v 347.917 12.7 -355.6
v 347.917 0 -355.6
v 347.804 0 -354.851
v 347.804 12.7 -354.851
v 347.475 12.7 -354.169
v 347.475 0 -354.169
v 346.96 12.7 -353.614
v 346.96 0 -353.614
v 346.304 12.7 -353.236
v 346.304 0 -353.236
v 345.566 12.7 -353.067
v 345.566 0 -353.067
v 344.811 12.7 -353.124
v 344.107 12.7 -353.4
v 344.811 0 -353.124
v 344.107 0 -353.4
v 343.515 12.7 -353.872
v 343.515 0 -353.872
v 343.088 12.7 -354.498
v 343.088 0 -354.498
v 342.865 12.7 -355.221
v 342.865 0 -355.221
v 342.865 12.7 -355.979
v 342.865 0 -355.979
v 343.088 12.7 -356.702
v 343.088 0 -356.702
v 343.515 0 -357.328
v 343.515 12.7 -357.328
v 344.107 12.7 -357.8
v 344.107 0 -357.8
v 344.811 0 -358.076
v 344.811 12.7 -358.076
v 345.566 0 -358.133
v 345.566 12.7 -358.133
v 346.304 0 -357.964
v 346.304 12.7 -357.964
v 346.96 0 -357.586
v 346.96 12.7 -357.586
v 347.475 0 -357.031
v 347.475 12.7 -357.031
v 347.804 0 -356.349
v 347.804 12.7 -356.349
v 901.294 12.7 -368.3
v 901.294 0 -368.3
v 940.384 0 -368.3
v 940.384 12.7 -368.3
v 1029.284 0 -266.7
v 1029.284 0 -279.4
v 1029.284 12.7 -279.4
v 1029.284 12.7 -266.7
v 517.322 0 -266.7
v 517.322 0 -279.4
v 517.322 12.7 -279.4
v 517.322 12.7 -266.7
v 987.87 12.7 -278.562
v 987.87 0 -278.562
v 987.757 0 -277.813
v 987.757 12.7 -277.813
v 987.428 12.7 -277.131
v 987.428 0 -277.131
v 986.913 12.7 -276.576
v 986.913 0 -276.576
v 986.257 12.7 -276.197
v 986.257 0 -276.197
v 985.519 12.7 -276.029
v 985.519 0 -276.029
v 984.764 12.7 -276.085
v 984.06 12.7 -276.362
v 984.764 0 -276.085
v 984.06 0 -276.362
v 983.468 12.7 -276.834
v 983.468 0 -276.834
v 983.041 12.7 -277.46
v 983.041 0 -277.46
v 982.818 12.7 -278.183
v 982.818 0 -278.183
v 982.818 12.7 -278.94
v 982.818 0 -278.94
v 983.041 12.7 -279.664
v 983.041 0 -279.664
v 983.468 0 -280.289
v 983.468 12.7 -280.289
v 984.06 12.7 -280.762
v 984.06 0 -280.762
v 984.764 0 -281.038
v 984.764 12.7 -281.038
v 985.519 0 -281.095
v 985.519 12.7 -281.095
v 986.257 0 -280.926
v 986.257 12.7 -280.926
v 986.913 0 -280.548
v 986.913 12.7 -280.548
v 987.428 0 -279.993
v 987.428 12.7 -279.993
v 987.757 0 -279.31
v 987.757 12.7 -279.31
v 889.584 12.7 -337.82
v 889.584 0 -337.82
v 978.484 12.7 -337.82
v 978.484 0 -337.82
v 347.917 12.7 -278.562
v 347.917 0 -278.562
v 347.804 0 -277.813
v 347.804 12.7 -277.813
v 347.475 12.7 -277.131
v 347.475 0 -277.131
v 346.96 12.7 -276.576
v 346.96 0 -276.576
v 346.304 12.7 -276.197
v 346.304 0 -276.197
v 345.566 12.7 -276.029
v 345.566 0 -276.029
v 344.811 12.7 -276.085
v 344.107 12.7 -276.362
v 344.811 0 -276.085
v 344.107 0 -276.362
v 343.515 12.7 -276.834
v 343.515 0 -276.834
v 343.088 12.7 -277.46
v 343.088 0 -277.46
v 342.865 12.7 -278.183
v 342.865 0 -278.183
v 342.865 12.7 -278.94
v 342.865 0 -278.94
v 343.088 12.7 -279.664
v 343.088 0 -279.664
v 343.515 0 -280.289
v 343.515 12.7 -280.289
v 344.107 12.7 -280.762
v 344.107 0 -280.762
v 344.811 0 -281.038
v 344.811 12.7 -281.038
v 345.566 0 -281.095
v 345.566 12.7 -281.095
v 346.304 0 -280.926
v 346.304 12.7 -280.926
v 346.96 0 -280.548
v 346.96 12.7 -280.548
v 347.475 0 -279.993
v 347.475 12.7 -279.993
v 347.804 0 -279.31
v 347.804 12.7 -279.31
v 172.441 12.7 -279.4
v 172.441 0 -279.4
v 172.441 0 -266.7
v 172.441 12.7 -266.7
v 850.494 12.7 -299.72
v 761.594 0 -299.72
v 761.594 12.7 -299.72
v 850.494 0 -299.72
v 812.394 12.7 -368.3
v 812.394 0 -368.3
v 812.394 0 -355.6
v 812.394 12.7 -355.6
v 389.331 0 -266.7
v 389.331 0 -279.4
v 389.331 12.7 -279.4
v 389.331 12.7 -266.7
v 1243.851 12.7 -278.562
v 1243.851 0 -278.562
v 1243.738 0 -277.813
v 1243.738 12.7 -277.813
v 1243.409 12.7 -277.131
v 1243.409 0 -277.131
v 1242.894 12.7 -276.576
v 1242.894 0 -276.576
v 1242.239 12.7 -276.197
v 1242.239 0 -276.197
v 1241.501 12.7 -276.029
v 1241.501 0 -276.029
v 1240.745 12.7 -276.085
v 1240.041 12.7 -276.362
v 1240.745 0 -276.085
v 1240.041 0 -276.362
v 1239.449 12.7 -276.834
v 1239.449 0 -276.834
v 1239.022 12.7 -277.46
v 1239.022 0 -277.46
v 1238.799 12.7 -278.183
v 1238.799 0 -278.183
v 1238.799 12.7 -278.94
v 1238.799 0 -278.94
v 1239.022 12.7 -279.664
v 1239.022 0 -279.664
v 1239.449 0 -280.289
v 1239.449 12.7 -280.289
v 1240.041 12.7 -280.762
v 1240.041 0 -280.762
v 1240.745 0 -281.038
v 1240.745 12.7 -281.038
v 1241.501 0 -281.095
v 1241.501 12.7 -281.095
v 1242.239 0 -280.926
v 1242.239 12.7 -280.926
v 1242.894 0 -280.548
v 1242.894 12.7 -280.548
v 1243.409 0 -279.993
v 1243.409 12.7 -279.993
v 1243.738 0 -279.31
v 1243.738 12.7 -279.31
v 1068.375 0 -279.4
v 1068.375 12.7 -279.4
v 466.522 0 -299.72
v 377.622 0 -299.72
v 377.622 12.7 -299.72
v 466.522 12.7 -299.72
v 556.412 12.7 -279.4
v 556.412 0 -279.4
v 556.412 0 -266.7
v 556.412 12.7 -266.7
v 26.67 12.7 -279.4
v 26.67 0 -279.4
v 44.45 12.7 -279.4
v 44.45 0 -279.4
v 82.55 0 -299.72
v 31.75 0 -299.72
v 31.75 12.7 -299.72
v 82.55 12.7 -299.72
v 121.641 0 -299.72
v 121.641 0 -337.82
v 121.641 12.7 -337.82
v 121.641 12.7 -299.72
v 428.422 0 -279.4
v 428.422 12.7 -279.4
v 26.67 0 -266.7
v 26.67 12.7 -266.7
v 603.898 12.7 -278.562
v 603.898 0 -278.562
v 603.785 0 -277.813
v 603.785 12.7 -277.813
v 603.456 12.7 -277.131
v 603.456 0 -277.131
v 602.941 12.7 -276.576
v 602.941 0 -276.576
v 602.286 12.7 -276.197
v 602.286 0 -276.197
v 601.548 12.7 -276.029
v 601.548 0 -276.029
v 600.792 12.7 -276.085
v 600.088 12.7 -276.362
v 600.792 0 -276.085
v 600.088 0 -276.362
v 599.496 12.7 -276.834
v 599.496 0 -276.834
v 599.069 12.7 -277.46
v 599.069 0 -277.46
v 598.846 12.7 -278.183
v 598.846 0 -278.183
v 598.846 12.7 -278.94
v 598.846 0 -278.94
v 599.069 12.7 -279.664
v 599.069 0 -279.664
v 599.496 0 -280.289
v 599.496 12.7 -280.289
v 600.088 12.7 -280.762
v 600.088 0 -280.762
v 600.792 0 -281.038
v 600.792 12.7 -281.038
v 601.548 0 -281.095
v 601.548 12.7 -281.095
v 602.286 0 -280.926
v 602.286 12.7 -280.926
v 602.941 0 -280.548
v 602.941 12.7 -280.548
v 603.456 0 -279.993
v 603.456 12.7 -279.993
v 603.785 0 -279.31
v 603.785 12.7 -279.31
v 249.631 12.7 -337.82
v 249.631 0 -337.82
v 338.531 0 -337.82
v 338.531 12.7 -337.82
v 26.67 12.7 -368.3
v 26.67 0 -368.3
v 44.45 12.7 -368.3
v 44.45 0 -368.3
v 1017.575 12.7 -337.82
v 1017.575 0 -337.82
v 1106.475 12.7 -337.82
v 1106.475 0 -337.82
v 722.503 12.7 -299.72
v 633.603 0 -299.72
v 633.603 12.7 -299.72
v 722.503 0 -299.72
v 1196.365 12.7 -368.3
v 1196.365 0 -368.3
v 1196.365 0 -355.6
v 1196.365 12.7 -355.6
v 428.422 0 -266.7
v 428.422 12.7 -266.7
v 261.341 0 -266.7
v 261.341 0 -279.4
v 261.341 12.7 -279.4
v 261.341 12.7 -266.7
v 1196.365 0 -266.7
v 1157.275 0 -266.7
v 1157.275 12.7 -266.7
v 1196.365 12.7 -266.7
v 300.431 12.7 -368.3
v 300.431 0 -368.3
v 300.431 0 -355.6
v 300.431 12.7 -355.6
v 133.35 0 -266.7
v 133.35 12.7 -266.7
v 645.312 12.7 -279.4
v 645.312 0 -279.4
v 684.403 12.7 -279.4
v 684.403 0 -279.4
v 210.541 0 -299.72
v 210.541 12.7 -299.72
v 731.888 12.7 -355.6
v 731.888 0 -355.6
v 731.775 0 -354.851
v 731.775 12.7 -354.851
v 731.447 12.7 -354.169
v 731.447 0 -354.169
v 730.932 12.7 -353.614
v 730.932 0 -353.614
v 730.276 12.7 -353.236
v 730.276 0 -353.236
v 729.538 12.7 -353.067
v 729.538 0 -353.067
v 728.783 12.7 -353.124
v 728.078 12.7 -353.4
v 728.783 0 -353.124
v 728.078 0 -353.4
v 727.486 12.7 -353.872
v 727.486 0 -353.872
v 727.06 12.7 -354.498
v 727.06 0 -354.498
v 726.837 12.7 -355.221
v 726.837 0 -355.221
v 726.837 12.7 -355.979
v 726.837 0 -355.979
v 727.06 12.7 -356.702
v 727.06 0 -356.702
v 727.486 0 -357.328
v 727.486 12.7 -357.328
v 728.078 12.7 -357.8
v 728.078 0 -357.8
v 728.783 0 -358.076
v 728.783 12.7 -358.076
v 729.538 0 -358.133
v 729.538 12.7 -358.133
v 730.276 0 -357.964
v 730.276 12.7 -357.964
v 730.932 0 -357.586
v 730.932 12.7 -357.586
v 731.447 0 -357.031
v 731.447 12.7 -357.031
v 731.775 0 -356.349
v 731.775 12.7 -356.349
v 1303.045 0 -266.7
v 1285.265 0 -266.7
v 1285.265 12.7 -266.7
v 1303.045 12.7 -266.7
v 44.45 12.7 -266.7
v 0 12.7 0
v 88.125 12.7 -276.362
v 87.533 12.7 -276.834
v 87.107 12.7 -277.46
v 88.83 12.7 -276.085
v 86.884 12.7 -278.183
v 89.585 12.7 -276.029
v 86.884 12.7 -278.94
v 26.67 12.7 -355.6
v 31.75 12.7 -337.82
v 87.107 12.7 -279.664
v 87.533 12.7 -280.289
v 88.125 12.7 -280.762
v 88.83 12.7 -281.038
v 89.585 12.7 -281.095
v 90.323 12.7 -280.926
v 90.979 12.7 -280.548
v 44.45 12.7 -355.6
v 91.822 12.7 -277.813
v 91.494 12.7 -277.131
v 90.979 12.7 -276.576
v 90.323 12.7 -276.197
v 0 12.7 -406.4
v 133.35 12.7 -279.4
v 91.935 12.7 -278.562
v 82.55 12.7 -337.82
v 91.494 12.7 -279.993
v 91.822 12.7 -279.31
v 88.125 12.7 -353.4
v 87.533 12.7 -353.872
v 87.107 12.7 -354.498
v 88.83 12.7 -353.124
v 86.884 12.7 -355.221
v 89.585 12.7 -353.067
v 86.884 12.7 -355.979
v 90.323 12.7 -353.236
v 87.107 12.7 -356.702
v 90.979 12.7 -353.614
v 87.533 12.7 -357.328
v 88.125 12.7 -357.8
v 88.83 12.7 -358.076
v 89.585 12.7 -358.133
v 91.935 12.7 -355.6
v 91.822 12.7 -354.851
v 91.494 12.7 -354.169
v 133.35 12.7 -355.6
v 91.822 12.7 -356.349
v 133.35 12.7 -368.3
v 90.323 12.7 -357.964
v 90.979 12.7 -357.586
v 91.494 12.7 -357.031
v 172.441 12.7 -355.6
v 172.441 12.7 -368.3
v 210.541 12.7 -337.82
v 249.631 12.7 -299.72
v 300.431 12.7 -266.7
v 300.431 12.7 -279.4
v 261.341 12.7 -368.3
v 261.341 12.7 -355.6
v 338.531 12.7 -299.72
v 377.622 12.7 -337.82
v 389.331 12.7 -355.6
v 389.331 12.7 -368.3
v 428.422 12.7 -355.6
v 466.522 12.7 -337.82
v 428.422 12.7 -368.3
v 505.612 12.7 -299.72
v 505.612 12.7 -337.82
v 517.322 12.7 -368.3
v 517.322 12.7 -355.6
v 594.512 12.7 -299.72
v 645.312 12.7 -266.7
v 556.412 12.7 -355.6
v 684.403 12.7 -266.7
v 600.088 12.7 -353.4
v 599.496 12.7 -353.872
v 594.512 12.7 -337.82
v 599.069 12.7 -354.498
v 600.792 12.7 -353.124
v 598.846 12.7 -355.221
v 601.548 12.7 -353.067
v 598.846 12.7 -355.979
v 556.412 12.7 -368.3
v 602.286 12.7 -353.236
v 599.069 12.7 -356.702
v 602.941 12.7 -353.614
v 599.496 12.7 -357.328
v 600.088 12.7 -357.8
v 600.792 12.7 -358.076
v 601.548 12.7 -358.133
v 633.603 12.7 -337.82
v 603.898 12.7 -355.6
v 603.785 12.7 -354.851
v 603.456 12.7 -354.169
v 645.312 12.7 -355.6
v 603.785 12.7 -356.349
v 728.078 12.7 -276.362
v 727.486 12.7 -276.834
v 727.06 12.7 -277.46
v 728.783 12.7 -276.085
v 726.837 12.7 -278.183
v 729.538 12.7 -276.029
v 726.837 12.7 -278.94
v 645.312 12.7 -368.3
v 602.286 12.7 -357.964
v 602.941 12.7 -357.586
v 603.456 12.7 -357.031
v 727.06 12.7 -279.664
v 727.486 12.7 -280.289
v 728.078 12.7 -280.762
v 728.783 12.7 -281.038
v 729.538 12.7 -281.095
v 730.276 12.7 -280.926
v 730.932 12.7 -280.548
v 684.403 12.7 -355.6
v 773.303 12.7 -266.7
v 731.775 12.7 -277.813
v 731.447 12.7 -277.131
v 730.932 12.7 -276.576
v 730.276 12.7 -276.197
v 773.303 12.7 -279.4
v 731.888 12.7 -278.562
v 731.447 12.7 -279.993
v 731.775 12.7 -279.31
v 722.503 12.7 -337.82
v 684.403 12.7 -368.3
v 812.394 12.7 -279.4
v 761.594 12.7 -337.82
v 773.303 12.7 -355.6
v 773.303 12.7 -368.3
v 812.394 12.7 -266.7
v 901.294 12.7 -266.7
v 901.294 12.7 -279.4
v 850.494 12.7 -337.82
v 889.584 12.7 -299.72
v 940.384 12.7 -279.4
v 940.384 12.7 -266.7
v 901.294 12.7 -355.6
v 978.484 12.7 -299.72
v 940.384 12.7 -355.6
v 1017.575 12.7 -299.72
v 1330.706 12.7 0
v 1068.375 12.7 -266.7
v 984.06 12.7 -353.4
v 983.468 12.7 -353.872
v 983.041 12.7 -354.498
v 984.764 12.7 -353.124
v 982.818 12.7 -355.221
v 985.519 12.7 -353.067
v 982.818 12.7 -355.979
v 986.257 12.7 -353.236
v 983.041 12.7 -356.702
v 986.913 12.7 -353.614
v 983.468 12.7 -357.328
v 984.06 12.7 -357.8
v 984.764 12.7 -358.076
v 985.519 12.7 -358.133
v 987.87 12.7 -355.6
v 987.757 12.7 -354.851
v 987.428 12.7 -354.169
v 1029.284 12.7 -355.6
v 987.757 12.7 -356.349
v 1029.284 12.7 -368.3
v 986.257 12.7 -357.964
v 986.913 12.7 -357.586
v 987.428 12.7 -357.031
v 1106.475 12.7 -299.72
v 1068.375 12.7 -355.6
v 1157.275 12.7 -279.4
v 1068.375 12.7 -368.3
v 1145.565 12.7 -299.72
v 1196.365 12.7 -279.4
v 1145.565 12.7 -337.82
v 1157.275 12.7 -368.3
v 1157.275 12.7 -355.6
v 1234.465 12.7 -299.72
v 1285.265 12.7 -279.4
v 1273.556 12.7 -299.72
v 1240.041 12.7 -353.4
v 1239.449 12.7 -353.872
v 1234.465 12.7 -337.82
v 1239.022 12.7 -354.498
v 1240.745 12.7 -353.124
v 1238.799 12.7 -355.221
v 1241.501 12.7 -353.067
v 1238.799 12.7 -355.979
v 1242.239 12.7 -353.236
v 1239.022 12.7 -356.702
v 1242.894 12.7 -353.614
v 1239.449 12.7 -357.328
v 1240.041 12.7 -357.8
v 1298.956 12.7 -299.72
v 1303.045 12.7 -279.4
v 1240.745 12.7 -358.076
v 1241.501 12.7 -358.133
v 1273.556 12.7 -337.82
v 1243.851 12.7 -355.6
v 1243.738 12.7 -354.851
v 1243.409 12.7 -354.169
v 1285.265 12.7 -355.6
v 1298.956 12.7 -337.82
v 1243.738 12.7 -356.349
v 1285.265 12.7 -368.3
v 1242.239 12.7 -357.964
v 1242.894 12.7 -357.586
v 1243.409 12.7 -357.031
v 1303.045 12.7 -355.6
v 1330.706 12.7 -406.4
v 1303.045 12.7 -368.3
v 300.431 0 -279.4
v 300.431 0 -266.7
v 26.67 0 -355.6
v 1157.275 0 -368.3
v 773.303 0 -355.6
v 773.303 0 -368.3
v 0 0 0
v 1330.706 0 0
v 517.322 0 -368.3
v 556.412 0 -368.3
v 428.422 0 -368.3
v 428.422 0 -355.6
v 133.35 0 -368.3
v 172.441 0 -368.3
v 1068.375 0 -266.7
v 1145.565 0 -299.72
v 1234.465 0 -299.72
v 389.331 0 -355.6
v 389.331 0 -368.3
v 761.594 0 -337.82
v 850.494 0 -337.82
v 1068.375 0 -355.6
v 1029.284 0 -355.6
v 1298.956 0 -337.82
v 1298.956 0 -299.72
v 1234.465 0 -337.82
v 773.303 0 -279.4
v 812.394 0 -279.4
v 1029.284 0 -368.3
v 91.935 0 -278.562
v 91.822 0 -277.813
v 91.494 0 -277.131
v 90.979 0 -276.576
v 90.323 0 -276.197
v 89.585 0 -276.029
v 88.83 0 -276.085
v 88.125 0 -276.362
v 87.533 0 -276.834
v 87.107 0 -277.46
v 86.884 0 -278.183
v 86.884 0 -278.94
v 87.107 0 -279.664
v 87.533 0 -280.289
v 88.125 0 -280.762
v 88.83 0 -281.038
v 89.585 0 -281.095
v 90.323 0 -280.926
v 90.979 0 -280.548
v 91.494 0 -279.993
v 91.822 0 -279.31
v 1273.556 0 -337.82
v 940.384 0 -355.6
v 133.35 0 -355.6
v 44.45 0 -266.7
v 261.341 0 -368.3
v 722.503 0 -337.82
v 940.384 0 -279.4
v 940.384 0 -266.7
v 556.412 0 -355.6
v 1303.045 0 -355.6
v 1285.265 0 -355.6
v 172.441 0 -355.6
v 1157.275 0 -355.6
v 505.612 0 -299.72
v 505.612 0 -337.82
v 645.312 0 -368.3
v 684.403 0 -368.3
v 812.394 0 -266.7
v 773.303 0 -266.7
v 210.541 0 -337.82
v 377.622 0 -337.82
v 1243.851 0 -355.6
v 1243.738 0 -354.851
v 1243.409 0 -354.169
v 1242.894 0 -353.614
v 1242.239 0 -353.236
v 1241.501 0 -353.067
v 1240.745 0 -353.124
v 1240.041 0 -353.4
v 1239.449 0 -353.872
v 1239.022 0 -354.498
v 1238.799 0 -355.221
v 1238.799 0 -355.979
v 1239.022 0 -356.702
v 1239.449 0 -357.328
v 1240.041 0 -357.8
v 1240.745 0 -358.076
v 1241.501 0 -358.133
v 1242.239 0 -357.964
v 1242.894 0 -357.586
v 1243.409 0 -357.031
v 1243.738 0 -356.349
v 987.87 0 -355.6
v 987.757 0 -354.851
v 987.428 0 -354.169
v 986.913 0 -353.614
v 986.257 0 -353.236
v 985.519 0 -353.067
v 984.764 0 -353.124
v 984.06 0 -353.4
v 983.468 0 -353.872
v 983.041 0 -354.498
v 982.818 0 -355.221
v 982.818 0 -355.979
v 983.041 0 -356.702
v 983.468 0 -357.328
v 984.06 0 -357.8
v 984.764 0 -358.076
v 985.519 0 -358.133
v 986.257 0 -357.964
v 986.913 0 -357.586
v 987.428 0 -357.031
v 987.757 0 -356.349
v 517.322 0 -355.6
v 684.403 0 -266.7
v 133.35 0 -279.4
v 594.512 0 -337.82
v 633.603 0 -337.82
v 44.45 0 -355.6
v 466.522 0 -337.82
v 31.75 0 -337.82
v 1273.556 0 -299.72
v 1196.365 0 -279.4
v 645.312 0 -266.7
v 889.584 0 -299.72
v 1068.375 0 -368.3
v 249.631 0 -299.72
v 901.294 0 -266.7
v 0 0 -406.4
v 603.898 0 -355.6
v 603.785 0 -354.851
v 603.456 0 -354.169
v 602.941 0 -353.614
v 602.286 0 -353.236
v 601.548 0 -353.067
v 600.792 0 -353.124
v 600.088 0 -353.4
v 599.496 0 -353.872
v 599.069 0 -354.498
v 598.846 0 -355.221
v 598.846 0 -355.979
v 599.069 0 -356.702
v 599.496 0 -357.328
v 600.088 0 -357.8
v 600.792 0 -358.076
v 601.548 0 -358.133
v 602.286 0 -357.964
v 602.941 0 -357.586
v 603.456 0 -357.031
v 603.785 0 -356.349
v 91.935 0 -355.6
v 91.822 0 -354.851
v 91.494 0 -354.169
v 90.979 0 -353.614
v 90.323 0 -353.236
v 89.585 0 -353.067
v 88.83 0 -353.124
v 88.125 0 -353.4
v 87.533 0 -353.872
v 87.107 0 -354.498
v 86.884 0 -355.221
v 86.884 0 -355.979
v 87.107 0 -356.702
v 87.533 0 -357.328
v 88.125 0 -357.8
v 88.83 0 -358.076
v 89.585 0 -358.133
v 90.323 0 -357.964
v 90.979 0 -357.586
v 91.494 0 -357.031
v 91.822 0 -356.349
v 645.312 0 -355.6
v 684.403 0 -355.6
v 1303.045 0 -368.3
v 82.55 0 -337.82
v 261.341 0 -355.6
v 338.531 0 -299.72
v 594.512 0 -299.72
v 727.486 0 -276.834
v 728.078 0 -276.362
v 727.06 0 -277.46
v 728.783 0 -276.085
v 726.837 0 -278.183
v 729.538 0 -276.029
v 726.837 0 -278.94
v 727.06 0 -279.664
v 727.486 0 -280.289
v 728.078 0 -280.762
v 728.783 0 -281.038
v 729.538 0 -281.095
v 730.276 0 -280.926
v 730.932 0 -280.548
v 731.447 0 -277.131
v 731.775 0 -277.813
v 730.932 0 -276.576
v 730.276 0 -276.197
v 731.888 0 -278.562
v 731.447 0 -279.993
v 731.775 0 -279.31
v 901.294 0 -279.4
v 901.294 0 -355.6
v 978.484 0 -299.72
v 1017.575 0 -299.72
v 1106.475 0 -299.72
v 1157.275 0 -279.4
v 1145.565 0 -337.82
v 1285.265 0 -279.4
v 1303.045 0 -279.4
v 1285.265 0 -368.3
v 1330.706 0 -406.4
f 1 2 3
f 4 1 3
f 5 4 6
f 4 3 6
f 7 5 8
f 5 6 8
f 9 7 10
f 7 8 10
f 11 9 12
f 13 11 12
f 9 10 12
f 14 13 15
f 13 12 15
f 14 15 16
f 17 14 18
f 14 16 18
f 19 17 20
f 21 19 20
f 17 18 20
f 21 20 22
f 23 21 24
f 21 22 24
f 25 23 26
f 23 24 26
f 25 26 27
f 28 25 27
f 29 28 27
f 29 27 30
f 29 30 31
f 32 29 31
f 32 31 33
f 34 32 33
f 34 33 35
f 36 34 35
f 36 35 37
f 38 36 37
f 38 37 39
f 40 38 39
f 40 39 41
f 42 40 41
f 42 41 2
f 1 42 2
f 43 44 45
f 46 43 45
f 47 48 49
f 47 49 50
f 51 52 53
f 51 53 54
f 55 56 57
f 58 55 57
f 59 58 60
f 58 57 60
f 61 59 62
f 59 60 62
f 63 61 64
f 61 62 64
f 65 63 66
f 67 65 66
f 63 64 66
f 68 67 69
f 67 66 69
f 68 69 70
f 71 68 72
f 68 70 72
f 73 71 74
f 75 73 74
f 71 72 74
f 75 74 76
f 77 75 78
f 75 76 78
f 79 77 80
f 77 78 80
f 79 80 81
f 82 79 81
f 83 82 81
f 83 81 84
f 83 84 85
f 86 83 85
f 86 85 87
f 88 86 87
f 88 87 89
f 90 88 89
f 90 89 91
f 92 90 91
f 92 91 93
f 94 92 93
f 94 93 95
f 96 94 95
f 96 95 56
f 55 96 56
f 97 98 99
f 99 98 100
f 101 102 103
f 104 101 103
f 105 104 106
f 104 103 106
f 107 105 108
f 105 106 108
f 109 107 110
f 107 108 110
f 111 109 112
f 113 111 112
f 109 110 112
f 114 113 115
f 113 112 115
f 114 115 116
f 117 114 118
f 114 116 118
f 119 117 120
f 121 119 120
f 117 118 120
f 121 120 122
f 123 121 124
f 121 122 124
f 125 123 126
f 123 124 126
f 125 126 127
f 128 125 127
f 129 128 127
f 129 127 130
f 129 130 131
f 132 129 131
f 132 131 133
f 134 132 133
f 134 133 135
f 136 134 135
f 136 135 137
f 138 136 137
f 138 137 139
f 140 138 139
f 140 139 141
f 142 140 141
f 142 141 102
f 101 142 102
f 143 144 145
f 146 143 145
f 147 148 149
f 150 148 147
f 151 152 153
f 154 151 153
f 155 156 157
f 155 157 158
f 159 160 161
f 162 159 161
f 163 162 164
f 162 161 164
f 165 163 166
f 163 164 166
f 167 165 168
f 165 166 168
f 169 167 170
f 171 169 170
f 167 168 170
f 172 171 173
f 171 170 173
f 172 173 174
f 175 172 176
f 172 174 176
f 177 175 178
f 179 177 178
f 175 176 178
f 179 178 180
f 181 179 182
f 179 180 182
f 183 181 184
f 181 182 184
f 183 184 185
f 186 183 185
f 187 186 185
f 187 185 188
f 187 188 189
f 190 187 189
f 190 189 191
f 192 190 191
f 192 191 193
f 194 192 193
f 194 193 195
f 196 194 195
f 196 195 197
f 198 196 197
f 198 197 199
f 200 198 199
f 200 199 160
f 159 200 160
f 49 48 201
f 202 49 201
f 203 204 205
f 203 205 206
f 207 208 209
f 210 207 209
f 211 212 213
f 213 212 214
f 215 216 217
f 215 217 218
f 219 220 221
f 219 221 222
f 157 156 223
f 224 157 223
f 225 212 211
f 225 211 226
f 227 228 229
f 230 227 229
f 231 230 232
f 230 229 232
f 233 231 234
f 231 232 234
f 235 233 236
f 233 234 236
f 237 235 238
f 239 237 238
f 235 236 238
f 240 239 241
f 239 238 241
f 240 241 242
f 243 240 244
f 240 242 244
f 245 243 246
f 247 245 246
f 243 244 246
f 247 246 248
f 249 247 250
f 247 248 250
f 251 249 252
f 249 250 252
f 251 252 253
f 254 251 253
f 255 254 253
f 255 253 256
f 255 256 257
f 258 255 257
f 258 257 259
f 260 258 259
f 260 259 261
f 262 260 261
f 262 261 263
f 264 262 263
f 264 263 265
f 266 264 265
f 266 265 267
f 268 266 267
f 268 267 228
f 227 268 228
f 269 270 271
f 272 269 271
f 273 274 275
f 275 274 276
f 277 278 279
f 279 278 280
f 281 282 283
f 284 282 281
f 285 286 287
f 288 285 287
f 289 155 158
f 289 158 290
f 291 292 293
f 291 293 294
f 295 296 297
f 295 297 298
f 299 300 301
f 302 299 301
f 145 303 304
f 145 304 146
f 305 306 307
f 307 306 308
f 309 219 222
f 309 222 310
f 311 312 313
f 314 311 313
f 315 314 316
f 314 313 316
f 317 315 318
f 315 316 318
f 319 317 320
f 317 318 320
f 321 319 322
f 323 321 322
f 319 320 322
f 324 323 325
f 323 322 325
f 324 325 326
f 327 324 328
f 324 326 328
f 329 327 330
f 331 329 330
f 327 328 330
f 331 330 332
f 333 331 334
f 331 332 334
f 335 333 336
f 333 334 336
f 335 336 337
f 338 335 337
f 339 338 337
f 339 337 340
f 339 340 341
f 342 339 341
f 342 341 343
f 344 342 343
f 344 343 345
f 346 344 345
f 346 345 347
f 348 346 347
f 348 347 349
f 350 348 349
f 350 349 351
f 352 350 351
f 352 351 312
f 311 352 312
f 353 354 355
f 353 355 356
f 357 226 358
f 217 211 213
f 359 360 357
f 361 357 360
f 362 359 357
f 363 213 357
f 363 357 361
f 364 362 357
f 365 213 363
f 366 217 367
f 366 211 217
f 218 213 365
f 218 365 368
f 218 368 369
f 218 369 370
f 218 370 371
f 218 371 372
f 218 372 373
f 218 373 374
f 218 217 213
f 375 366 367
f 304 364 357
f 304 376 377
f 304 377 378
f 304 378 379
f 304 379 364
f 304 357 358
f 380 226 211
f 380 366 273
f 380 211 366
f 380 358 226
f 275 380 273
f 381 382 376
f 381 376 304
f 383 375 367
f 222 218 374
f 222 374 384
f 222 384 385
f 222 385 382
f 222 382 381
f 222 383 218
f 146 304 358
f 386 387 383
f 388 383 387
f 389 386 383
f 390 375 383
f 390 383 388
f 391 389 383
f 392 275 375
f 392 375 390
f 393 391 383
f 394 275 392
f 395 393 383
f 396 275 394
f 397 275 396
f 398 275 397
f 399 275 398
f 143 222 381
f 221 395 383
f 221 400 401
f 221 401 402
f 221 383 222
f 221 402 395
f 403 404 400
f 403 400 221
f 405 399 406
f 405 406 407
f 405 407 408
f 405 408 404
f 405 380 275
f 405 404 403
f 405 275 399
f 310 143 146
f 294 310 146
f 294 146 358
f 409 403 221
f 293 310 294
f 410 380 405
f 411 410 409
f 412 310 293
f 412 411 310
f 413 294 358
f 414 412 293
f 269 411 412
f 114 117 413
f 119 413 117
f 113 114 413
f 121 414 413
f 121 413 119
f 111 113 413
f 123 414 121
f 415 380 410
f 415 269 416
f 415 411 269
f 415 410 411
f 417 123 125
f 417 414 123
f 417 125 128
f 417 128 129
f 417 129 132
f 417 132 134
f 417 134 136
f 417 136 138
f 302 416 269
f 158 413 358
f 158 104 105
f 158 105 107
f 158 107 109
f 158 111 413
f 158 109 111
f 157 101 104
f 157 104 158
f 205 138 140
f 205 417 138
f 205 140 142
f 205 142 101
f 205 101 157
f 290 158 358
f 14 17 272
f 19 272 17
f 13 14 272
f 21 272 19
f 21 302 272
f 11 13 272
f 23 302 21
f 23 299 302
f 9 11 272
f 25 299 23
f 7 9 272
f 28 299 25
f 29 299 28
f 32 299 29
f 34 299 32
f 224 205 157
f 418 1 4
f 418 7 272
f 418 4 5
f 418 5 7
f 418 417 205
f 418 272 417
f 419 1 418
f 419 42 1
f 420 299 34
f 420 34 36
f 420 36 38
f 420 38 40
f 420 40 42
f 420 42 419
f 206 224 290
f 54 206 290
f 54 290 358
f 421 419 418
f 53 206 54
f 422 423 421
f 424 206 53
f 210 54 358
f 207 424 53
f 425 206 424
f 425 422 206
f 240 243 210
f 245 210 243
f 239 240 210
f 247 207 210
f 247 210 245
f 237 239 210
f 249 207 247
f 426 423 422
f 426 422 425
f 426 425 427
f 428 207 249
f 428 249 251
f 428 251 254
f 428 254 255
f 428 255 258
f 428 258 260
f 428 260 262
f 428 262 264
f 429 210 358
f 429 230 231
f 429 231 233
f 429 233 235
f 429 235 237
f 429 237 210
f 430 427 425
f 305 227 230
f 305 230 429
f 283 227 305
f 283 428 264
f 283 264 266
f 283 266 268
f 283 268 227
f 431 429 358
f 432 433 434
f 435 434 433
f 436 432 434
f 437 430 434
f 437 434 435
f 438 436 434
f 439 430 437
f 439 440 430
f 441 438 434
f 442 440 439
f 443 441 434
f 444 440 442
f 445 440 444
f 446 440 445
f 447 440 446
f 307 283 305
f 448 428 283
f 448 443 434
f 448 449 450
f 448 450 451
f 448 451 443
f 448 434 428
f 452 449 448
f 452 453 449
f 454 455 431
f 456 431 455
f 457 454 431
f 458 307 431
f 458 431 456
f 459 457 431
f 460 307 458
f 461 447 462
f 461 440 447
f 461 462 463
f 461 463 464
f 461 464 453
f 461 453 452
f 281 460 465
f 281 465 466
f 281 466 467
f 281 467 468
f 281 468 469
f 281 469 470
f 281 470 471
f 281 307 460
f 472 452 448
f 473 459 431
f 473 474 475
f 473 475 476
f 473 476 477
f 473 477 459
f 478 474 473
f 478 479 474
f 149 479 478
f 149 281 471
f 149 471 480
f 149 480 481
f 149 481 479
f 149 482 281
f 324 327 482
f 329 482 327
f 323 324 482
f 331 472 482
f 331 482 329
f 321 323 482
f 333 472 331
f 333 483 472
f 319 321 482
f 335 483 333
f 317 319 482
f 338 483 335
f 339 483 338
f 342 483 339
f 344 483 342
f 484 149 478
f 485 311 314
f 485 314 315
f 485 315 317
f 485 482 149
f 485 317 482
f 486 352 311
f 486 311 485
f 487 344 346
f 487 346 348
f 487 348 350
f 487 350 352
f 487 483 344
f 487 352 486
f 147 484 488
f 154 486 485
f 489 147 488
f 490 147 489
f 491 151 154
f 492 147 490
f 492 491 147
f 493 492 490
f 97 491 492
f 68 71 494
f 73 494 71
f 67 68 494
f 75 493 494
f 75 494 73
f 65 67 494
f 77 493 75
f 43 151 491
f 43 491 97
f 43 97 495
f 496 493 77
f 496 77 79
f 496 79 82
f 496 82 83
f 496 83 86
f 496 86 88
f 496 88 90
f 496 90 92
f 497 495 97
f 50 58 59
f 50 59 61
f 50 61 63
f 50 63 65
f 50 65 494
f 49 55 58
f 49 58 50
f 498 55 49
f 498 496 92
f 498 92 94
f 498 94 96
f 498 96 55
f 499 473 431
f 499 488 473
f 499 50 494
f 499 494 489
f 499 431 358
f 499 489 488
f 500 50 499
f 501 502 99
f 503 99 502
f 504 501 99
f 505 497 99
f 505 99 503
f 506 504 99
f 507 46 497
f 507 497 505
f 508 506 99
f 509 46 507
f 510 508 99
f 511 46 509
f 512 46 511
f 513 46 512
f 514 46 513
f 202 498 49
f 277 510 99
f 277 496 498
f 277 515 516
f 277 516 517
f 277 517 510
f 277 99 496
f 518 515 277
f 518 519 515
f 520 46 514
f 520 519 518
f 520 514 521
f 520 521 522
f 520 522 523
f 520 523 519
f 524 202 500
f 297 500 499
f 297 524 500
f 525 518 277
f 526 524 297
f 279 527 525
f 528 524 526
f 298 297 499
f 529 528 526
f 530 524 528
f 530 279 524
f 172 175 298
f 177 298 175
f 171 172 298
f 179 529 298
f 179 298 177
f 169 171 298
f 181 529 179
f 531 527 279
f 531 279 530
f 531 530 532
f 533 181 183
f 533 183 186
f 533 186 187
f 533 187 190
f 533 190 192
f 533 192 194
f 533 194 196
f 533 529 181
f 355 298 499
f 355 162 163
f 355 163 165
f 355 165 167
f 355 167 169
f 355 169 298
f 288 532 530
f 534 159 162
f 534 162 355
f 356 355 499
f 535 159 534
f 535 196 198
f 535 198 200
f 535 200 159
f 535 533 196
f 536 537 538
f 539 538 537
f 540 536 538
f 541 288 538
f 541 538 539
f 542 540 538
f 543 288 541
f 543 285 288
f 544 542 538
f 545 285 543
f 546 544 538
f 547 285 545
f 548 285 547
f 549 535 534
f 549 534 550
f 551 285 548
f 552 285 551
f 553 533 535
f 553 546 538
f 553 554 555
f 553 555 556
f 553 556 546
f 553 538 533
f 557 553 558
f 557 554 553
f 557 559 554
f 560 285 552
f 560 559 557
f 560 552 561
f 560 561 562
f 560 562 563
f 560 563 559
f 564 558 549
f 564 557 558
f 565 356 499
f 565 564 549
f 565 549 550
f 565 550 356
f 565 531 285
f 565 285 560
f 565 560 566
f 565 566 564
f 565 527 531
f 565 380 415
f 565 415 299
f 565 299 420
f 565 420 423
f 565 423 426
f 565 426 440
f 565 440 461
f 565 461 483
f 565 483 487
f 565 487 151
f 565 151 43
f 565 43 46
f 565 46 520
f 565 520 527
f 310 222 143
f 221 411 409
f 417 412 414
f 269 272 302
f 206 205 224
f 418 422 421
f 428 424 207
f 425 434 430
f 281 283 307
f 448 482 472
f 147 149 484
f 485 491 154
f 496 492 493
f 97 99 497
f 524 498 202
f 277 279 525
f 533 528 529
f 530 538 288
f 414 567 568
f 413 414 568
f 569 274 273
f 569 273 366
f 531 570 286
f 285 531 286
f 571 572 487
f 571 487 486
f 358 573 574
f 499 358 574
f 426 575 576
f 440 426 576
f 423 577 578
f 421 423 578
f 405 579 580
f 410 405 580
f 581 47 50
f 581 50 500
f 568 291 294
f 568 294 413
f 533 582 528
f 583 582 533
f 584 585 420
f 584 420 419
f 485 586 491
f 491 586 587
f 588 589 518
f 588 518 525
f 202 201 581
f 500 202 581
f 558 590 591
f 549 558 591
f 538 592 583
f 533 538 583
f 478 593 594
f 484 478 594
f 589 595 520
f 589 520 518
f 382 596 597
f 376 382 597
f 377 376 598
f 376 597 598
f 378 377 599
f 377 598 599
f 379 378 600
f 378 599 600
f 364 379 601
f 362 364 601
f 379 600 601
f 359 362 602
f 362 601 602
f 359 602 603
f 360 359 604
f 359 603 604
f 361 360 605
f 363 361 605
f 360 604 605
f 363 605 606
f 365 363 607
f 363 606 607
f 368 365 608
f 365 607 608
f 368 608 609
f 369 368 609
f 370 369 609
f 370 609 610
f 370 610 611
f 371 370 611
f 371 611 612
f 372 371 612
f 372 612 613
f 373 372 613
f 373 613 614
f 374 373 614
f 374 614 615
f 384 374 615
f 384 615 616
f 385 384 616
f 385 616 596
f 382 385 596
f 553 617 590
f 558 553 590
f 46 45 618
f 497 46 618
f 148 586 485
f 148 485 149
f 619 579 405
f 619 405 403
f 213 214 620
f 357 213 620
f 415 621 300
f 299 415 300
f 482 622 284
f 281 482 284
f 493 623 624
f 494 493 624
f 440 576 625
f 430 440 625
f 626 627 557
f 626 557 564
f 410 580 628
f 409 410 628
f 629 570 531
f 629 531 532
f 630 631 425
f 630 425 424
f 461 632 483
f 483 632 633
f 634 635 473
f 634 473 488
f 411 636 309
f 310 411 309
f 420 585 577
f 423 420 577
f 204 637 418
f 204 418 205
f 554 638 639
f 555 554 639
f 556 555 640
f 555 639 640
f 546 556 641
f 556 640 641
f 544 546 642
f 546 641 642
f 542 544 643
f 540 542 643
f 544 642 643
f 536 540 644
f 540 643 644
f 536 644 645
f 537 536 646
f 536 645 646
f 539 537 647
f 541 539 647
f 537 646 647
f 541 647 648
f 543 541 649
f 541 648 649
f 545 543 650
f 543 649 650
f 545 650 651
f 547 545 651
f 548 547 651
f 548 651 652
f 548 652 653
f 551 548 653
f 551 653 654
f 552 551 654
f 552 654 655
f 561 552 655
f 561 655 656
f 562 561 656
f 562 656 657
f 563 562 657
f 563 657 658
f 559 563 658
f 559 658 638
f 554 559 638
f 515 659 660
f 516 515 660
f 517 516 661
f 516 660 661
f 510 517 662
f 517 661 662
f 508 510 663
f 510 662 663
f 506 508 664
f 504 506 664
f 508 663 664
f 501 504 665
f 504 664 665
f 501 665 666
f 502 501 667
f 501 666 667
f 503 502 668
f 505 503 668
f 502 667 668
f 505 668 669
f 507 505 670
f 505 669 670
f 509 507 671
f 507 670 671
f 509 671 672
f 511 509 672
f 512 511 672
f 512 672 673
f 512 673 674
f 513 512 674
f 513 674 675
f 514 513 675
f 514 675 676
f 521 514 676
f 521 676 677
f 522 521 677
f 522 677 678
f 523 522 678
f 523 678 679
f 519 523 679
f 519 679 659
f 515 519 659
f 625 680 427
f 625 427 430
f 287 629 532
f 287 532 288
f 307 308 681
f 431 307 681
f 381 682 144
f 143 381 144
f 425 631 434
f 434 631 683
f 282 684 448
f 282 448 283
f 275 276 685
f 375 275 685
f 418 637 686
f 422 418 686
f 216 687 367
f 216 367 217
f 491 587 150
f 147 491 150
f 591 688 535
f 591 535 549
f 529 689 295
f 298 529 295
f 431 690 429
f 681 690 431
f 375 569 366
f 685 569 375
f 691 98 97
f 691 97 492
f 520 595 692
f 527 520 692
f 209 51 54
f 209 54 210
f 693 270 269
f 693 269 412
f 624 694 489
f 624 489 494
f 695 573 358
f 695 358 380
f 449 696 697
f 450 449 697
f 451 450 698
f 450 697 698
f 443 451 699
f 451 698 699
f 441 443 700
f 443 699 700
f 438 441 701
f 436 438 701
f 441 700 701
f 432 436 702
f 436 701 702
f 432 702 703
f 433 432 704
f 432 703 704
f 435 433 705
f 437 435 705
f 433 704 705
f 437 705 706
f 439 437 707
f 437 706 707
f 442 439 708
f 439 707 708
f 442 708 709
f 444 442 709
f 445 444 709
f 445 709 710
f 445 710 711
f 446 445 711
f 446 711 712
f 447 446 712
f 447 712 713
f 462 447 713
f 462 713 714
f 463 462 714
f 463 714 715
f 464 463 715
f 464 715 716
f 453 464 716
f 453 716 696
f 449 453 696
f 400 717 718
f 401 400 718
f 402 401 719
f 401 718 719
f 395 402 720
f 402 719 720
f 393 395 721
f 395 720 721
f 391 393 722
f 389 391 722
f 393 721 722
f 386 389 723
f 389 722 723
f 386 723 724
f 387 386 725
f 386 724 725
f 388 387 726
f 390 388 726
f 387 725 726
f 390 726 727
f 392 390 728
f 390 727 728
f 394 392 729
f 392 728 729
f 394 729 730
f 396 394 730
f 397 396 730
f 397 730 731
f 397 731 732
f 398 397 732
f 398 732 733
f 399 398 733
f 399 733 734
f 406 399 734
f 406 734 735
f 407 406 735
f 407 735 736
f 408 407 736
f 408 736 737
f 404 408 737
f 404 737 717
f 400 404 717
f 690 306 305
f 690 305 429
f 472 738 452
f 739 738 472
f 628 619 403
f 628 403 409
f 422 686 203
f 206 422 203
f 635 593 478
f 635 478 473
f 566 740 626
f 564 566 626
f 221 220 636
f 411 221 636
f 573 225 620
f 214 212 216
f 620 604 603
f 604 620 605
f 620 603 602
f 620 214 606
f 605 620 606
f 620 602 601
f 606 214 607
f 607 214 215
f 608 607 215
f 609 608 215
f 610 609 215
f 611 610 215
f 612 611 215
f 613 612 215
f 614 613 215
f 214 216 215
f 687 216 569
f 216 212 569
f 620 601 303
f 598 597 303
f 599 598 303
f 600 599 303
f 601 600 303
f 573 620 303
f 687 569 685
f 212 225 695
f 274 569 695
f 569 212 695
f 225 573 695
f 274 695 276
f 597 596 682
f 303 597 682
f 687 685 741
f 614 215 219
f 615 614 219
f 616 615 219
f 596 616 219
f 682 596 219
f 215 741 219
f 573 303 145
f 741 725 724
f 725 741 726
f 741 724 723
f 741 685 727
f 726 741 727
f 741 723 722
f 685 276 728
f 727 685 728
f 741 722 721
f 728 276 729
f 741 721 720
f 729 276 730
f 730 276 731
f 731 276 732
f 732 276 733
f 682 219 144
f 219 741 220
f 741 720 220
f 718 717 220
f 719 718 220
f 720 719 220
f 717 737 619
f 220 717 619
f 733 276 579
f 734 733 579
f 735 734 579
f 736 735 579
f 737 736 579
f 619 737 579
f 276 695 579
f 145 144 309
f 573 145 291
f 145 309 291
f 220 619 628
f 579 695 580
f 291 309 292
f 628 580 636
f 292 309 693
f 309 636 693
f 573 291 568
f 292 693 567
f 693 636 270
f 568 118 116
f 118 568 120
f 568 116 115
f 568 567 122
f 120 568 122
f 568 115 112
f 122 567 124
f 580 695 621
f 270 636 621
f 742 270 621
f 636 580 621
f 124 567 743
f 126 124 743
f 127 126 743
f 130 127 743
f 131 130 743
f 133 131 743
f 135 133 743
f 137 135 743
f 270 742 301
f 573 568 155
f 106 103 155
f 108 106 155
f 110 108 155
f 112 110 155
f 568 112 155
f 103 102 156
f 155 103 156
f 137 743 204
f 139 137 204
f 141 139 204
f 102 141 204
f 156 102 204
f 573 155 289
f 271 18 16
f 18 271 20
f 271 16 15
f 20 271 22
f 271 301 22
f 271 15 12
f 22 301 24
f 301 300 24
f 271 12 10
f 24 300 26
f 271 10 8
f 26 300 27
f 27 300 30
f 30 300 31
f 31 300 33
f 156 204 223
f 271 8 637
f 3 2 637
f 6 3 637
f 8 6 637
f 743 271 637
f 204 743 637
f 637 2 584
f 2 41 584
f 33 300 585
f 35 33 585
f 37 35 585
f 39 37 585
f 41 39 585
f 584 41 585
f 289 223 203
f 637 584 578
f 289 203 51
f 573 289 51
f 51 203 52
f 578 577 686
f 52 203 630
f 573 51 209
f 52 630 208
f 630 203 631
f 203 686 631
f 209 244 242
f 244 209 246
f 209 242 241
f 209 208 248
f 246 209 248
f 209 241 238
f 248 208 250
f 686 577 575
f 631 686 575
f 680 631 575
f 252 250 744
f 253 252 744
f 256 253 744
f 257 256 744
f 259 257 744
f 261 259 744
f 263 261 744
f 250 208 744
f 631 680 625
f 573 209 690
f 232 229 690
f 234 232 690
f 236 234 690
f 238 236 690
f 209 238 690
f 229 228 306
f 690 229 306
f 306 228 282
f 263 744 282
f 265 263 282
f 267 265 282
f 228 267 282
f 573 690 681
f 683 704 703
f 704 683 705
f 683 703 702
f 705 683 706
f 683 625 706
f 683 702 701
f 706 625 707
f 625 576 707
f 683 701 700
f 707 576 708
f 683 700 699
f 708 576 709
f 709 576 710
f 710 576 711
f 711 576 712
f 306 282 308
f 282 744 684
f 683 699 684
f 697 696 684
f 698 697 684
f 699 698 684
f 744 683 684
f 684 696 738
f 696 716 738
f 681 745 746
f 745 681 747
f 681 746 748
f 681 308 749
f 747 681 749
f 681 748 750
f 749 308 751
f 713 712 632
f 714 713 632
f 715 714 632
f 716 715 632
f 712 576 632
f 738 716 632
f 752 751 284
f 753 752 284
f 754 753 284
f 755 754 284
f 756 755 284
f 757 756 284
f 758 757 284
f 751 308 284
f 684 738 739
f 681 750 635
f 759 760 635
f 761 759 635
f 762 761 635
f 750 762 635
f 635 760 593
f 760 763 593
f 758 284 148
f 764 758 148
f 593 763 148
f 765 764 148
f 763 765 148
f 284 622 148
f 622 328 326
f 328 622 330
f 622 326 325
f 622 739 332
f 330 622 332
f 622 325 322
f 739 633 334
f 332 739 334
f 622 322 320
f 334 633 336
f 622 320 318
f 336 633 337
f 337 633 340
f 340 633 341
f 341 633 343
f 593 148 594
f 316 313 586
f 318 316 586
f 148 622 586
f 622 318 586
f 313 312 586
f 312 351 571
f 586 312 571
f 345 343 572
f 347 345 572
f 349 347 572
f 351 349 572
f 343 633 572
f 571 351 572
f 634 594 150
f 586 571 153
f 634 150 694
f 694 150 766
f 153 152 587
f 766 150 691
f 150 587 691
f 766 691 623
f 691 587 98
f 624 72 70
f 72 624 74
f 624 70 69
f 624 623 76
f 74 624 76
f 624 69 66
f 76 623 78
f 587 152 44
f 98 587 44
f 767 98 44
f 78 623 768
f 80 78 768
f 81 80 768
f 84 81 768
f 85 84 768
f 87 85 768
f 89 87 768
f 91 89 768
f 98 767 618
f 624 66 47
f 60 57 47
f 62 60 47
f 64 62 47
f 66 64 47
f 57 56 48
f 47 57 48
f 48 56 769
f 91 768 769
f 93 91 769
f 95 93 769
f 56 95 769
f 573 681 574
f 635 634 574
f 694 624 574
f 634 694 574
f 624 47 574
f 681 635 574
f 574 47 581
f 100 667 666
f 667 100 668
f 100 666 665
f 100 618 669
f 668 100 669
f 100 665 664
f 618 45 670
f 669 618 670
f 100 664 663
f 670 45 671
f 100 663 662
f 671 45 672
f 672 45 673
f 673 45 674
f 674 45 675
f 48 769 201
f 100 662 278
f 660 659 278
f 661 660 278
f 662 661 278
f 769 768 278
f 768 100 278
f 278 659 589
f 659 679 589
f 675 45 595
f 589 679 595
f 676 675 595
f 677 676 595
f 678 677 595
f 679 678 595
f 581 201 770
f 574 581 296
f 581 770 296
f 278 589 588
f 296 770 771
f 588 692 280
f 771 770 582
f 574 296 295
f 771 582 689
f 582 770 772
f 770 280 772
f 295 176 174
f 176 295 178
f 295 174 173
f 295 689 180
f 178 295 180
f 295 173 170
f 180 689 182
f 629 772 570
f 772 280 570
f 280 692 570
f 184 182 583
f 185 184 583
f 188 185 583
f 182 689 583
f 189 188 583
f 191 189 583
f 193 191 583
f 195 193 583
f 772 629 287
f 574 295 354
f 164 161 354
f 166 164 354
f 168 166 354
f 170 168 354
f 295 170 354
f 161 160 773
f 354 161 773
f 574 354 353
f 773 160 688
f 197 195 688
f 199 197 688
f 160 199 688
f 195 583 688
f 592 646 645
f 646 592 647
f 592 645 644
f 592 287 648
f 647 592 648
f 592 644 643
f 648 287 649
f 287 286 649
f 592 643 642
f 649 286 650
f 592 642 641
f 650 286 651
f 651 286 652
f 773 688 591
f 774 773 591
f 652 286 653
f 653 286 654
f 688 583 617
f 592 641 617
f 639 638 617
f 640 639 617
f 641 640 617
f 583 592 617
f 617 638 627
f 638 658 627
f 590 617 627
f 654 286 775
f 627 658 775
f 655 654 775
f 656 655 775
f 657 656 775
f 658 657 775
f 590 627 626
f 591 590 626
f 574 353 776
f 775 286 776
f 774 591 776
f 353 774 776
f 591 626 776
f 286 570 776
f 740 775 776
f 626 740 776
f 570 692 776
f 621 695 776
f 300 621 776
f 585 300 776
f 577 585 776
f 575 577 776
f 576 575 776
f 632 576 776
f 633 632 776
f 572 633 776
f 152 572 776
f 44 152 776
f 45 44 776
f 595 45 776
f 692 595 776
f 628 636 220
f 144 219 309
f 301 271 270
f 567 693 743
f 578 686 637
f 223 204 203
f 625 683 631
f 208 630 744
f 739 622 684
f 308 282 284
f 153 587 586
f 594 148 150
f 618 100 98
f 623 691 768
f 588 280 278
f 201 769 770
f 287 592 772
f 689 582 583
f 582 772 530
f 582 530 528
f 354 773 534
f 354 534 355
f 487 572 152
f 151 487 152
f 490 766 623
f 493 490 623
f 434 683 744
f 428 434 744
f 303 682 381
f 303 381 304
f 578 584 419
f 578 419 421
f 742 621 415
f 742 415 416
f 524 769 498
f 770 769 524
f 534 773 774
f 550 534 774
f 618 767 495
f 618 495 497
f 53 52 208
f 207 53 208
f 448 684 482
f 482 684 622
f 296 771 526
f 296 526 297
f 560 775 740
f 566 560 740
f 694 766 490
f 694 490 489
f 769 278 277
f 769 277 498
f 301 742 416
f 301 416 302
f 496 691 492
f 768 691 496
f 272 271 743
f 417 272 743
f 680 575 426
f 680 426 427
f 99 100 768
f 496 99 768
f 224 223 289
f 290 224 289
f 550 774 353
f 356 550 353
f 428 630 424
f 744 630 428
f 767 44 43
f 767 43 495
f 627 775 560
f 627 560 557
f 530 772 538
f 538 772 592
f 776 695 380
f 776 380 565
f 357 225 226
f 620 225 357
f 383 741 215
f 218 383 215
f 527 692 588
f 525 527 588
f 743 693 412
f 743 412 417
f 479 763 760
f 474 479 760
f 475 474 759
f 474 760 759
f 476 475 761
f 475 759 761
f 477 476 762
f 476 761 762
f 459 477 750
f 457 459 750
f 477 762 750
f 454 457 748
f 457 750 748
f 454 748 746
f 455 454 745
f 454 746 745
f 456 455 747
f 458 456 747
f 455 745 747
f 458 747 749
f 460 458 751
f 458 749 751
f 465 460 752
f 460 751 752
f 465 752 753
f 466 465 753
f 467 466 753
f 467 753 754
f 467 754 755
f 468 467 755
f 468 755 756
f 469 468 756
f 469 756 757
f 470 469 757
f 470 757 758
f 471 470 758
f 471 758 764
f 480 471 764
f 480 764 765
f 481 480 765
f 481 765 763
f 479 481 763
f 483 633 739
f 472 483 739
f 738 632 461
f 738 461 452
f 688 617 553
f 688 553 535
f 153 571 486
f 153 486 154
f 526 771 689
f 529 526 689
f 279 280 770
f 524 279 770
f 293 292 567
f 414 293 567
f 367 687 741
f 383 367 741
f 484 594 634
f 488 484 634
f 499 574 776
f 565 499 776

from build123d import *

# Parameters (mm, degrees)
SKETCH1_W           = 1330.706
SKETCH1_H           = 406.4
BOSS_EXTRUDE1_DEPTH = 12.7
SKETCH3_R           = 2.54
SKETCH3_W           = 50.8
SKETCH3_H           = 38.1
SKETCH3_W_2         = 88.9
SKETCH3_W_3         = 17.78
SKETCH3_H_2         = 12.7
SKETCH3_W_4         = 25.4
SKETCH3_W_5         = 39.0906
CUT_EXTRUDE2_DEPTH  = 13.7


with BuildPart() as part:
    # Sketch1 → Boss-Extrude1 (new body)
    with BuildSketch(Plane(origin=(0, 0, 0), x_dir=(1, 0, 0), z_dir=(0, 1, 0))):
        with Locations((665.353, 203.2)):
            Rectangle(SKETCH1_W, SKETCH1_H)
    extrude(amount=BOSS_EXTRUDE1_DEPTH)

    # Sketch3 → Cut-Extrude2 (cut, through all)
    with BuildSketch(Plane.XZ):
        with Locations((89.3953, -278.5618)):
            Circle(SKETCH3_R)
        with Locations((89.3953, -355.6)):
            Circle(SKETCH3_R)
        with Locations((345.3765, -278.5618)):
            Circle(SKETCH3_R)
        with Locations((345.3765, -355.6)):
            Circle(SKETCH3_R)
        with Locations((601.3577, -278.5618)):
            Circle(SKETCH3_R)
        with Locations((601.3577, -355.6)):
            Circle(SKETCH3_R)
        with Locations((729.3483, -278.5618)):
            Circle(SKETCH3_R)
        with Locations((729.3483, -355.6)):
            Circle(SKETCH3_R)
        with Locations((985.3295, -278.5618)):
            Circle(SKETCH3_R)
        with Locations((985.3295, -355.6)):
            Circle(SKETCH3_R)
        with Locations((1241.3107, -278.5618)):
            Circle(SKETCH3_R)
        with Locations((1241.3107, -355.6)):
            Circle(SKETCH3_R)
        with Locations((57.15, -318.77)):
            Rectangle(SKETCH3_W, SKETCH3_H)
        with Locations((294.0812, -318.77)):
            Rectangle(SKETCH3_W_2, SKETCH3_H)
        with Locations((166.0906, -318.77)):
            Rectangle(SKETCH3_W_2, SKETCH3_H)
        with Locations((35.56, -361.95)):
            Rectangle(SKETCH3_W_3, SKETCH3_H_2)
        with Locations((422.0718, -318.77)):
            Rectangle(SKETCH3_W_2, SKETCH3_H)
        with Locations((550.0624, -318.77)):
            Rectangle(SKETCH3_W_2, SKETCH3_H)
        with Locations((678.053, -318.77)):
            Rectangle(SKETCH3_W_2, SKETCH3_H)
        with Locations((806.0436, -318.77)):
            Rectangle(SKETCH3_W_2, SKETCH3_H)
        with Locations((934.0342, -318.77)):
            Rectangle(SKETCH3_W_2, SKETCH3_H)
        with Locations((1062.0248, -318.77)):
            Rectangle(SKETCH3_W_2, SKETCH3_H)
        with Locations((1190.0154, -318.77)):
            Rectangle(SKETCH3_W_2, SKETCH3_H)
        with Locations((1286.256, -318.77)):
            Rectangle(SKETCH3_W_4, SKETCH3_H)
        with Locations((408.8765, -273.05)):
            Rectangle(SKETCH3_W_5, SKETCH3_H_2)
        with Locations((35.56, -273.05)):
            Rectangle(SKETCH3_W_3, SKETCH3_H_2)
        with Locations((152.8953, -273.05)):
            Rectangle(SKETCH3_W_5, SKETCH3_H_2)
        with Locations((152.8953, -361.95)):
            Rectangle(SKETCH3_W_5, SKETCH3_H_2)
        with Locations((280.8859, -273.05)):
            Rectangle(SKETCH3_W_5, SKETCH3_H_2)
        with Locations((280.8859, -361.95)):
            Rectangle(SKETCH3_W_5, SKETCH3_H_2)
        with Locations((408.8765, -361.95)):
            Rectangle(SKETCH3_W_5, SKETCH3_H_2)
        with Locations((536.8671, -361.95)):
            Rectangle(SKETCH3_W_5, SKETCH3_H_2)
        with Locations((536.8671, -273.05)):
            Rectangle(SKETCH3_W_5, SKETCH3_H_2)
        with Locations((664.8577, -361.95)):
            Rectangle(SKETCH3_W_5, SKETCH3_H_2)
        with Locations((664.8577, -273.05)):
            Rectangle(SKETCH3_W_5, SKETCH3_H_2)
        with Locations((792.8483, -273.05)):
            Rectangle(SKETCH3_W_5, SKETCH3_H_2)
        with Locations((920.8389, -361.95)):
            Rectangle(SKETCH3_W_5, SKETCH3_H_2)
        with Locations((792.8483, -361.95)):
            Rectangle(SKETCH3_W_5, SKETCH3_H_2)
        with Locations((920.8389, -273.05)):
            Rectangle(SKETCH3_W_5, SKETCH3_H_2)
        with Locations((1048.8295, -361.95)):
            Rectangle(SKETCH3_W_5, SKETCH3_H_2)
        with Locations((1048.8295, -273.05)):
            Rectangle(SKETCH3_W_5, SKETCH3_H_2)
        with Locations((1176.8201, -273.05)):
            Rectangle(SKETCH3_W_5, SKETCH3_H_2)
        with Locations((1176.8201, -361.95)):
            Rectangle(SKETCH3_W_5, SKETCH3_H_2)
        with Locations((1294.1554, -361.95)):
            Rectangle(SKETCH3_W_3, SKETCH3_H_2)
        with Locations((1294.1554, -273.05)):
            Rectangle(SKETCH3_W_3, SKETCH3_H_2)
    extrude(amount=-CUT_EXTRUDE2_DEPTH, mode=Mode.SUBTRACT)


solid = part.part
